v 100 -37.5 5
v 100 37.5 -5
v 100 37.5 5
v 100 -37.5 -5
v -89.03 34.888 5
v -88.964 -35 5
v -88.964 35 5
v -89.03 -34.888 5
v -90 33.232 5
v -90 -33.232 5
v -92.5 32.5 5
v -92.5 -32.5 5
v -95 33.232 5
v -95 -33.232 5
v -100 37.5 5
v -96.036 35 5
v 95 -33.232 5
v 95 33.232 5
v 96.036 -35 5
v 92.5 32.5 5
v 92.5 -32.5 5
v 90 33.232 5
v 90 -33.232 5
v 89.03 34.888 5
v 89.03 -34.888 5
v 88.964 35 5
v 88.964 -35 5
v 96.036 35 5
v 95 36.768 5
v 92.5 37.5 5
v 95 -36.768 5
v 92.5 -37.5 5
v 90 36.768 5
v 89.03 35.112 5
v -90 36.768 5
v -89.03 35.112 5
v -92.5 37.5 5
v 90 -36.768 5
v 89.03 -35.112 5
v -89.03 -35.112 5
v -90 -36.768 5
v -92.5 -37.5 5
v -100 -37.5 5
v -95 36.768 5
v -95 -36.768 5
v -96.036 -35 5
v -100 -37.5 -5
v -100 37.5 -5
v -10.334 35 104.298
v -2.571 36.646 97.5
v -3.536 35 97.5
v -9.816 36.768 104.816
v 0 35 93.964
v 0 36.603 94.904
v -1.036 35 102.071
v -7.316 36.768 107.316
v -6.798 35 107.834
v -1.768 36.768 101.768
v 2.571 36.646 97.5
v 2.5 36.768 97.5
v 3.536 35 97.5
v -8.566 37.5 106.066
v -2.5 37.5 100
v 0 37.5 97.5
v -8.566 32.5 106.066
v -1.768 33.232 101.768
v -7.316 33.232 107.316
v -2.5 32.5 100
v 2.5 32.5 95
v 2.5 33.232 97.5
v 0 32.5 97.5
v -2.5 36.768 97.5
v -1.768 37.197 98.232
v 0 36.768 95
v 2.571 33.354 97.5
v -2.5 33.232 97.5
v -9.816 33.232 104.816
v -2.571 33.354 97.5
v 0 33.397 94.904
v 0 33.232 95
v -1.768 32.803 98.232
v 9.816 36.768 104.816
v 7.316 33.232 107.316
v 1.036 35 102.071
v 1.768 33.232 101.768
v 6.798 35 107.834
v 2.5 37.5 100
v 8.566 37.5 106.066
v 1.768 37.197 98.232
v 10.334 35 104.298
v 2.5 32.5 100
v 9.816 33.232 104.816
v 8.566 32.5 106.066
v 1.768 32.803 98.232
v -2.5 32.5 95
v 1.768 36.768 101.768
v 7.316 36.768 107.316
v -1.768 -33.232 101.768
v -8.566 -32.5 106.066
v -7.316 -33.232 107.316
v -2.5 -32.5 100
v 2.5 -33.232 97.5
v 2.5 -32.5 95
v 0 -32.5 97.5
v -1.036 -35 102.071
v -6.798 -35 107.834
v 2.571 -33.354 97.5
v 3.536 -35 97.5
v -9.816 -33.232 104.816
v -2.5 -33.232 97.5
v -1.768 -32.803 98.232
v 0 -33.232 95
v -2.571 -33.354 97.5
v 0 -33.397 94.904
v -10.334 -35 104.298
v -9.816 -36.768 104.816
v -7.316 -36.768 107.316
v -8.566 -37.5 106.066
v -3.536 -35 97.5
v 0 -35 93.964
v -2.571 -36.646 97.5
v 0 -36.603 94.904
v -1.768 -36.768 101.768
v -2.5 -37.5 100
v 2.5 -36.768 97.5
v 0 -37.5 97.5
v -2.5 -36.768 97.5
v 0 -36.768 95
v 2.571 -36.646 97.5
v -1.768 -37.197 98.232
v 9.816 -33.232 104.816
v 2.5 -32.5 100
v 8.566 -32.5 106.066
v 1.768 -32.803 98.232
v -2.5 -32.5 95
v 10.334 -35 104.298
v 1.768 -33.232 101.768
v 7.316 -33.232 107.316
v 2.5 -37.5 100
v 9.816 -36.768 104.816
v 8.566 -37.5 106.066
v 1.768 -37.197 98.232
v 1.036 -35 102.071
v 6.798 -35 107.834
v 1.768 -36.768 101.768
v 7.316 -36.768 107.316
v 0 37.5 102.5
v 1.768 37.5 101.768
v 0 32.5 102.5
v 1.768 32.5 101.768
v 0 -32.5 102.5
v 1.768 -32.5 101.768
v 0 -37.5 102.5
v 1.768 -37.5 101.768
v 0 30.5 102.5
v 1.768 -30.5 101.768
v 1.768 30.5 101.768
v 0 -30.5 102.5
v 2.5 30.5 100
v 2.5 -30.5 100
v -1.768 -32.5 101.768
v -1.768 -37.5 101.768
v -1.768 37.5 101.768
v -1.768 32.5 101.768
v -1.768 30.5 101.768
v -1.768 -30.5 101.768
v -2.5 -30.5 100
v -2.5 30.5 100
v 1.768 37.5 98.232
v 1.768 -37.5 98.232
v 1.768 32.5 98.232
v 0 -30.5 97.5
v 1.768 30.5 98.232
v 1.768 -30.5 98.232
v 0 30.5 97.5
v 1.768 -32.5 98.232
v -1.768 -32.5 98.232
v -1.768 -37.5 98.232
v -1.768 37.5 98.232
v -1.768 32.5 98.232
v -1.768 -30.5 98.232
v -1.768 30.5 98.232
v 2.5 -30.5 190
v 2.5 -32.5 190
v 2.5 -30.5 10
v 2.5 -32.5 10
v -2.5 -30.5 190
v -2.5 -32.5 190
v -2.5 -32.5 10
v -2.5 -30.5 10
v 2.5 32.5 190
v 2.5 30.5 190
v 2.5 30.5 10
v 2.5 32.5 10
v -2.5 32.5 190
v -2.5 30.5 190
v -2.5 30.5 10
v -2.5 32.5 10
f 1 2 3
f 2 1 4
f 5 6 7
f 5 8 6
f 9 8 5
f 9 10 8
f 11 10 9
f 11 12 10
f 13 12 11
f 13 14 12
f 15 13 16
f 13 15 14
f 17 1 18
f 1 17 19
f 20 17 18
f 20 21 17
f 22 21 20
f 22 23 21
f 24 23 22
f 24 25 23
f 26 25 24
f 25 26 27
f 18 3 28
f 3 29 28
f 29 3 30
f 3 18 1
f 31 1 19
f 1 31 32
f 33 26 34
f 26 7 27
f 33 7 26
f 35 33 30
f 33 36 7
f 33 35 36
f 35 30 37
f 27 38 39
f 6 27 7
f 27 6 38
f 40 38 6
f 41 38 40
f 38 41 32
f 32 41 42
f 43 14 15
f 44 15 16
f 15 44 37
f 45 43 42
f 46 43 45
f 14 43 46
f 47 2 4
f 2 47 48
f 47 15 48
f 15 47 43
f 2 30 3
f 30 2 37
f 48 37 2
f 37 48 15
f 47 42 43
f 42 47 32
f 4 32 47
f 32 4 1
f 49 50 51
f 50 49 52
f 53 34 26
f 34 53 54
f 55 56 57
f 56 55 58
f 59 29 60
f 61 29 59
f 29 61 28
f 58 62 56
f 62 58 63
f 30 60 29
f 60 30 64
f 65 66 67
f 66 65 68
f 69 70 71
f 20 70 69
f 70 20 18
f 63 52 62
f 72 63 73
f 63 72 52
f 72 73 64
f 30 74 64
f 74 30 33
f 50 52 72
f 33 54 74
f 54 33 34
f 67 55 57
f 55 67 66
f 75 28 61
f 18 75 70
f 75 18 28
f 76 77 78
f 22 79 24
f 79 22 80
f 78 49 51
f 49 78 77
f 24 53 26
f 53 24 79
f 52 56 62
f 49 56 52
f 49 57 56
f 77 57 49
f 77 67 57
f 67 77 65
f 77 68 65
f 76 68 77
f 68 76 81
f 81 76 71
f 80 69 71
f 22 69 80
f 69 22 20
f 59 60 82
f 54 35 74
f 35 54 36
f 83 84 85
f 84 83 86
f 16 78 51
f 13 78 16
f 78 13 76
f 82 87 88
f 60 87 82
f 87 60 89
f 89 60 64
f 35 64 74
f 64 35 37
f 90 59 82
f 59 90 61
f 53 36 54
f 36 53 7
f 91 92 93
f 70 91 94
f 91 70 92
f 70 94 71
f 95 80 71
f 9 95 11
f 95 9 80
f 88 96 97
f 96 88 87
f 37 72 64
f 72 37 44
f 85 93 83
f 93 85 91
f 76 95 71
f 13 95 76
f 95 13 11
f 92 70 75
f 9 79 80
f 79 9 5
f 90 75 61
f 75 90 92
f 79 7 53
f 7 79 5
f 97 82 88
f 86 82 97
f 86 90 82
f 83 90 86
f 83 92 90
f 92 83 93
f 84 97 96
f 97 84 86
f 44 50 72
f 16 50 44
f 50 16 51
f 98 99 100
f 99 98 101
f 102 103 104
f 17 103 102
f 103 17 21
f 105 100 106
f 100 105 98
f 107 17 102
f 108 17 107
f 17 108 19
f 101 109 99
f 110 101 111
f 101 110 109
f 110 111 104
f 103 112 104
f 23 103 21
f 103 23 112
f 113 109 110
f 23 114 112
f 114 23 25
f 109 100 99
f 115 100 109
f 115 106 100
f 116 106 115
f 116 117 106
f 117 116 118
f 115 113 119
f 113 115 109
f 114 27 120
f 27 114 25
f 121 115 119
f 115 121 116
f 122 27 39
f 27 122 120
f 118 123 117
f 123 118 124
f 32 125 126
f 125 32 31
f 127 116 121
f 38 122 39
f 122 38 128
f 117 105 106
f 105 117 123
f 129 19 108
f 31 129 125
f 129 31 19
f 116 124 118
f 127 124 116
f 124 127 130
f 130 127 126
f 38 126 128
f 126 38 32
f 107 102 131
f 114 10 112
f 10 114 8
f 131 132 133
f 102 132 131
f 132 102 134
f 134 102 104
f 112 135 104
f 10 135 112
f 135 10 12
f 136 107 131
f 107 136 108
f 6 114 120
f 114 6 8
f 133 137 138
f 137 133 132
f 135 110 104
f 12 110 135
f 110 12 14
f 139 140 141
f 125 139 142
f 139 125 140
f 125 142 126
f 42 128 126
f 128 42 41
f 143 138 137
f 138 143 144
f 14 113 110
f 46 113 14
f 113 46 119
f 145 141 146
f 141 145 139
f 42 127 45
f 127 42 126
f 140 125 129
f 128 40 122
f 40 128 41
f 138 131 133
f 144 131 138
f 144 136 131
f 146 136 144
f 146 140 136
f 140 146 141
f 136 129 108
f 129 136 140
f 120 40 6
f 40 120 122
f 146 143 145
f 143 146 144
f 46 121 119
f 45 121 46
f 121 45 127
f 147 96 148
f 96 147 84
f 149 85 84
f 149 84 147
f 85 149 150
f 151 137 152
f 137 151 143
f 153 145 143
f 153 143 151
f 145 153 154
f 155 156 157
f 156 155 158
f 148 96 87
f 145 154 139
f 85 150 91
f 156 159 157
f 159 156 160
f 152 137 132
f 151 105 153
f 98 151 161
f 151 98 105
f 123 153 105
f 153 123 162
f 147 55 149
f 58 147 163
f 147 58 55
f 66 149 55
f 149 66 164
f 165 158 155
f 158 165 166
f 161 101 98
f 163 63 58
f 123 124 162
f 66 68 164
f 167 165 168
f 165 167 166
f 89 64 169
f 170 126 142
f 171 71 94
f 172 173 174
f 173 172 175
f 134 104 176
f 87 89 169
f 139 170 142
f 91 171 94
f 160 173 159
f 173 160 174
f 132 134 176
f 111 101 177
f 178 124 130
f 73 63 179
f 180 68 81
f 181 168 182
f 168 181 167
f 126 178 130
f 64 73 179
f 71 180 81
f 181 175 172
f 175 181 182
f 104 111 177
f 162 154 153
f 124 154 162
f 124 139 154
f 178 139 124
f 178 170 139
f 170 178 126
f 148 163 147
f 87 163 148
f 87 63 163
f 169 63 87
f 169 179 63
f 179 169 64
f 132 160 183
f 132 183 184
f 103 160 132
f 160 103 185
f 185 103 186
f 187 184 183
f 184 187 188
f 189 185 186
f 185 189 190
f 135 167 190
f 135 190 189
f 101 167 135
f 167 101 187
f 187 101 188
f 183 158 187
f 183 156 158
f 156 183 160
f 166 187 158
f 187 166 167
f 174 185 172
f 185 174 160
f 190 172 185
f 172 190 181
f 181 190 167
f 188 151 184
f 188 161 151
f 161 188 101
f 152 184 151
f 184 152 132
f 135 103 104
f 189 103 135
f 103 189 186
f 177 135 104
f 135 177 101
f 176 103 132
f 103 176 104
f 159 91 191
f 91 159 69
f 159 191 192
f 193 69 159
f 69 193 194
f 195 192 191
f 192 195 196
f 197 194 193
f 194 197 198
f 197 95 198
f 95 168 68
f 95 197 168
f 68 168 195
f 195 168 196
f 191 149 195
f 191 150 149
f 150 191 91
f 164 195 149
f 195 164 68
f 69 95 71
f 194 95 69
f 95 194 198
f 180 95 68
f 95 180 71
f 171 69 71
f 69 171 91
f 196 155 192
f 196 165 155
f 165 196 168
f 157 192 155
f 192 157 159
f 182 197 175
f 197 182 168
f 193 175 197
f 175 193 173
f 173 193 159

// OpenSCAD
//vars
wheelThickness = 7.5;
barDiameter = 5;
barLenght = 50;
// alterable 
wheelRadius = 100;
barAmount = 30;

// base
standWidth = wheelRadius*2;
standDepth = barLenght*1.5;
standHeight = 10;
// stand Bar
standBarLenght = wheelRadius * 1.5;
standBarDia = barDiameter;

// horizontal screw
scewLength = standDepth;
screwDia = barDiameter;

// plates to connect screw
plateWidth = barDiameter;
plateLength = wheelRadius * 1.8;
plateDepth = 2;





module stand(){
    // stand base
    cube([standWidth, standDepth, standHeight], center=true);
    
    // poles back
    translate([(standWidth/2 - standBarDia/2), (standDepth/2 - standBarDia/2), 0])
        rotate([0, -45, 0,])
            color([0, 0, 1])cylinder(h=standBarLenght, d=standBarDia, center=false);
    translate([-(standWidth/2 - standBarDia/2), (standDepth/2 - standBarDia/2), 0])
        rotate([0, 45, 0,])
            color([0, 1, 0])cylinder(h=standBarLenght, d=standBarDia, center=false);
    
    // poles front
        translate([(standWidth/2 - standBarDia/2), -(standDepth/2 - standBarDia/2), 0])
        rotate([0, -45, 0,])
            color([0, 0, 1])cylinder(h=standBarLenght, d=standBarDia, center=false);
    translate([-(standWidth/2 - standBarDia/2), -(standDepth/2 - standBarDia/2), 0])
        rotate([0, 45, 0,])
            color([0, 1, 0])cylinder(h=standBarLenght, d=standBarDia, center=false);
    
    // horizontal screw 
    translate([0, 0, wheelRadius])
        rotate([90, 0, 0])
            cylinder(scewLength, d=screwDia, center=true);
            
    // Plates to attach to screw and wheel
    translate([0, -(standDepth/2 - plateDepth*3), wheelRadius])
        color([1, 0, 0])cube([plateWidth, plateDepth, plateLength], center=true);
    translate([0, (standDepth/2 - plateDepth*3), wheelRadius])
        color([1, 0, 0])cube([plateWidth, plateDepth, plateLength], center=true);
    
}

stand();
